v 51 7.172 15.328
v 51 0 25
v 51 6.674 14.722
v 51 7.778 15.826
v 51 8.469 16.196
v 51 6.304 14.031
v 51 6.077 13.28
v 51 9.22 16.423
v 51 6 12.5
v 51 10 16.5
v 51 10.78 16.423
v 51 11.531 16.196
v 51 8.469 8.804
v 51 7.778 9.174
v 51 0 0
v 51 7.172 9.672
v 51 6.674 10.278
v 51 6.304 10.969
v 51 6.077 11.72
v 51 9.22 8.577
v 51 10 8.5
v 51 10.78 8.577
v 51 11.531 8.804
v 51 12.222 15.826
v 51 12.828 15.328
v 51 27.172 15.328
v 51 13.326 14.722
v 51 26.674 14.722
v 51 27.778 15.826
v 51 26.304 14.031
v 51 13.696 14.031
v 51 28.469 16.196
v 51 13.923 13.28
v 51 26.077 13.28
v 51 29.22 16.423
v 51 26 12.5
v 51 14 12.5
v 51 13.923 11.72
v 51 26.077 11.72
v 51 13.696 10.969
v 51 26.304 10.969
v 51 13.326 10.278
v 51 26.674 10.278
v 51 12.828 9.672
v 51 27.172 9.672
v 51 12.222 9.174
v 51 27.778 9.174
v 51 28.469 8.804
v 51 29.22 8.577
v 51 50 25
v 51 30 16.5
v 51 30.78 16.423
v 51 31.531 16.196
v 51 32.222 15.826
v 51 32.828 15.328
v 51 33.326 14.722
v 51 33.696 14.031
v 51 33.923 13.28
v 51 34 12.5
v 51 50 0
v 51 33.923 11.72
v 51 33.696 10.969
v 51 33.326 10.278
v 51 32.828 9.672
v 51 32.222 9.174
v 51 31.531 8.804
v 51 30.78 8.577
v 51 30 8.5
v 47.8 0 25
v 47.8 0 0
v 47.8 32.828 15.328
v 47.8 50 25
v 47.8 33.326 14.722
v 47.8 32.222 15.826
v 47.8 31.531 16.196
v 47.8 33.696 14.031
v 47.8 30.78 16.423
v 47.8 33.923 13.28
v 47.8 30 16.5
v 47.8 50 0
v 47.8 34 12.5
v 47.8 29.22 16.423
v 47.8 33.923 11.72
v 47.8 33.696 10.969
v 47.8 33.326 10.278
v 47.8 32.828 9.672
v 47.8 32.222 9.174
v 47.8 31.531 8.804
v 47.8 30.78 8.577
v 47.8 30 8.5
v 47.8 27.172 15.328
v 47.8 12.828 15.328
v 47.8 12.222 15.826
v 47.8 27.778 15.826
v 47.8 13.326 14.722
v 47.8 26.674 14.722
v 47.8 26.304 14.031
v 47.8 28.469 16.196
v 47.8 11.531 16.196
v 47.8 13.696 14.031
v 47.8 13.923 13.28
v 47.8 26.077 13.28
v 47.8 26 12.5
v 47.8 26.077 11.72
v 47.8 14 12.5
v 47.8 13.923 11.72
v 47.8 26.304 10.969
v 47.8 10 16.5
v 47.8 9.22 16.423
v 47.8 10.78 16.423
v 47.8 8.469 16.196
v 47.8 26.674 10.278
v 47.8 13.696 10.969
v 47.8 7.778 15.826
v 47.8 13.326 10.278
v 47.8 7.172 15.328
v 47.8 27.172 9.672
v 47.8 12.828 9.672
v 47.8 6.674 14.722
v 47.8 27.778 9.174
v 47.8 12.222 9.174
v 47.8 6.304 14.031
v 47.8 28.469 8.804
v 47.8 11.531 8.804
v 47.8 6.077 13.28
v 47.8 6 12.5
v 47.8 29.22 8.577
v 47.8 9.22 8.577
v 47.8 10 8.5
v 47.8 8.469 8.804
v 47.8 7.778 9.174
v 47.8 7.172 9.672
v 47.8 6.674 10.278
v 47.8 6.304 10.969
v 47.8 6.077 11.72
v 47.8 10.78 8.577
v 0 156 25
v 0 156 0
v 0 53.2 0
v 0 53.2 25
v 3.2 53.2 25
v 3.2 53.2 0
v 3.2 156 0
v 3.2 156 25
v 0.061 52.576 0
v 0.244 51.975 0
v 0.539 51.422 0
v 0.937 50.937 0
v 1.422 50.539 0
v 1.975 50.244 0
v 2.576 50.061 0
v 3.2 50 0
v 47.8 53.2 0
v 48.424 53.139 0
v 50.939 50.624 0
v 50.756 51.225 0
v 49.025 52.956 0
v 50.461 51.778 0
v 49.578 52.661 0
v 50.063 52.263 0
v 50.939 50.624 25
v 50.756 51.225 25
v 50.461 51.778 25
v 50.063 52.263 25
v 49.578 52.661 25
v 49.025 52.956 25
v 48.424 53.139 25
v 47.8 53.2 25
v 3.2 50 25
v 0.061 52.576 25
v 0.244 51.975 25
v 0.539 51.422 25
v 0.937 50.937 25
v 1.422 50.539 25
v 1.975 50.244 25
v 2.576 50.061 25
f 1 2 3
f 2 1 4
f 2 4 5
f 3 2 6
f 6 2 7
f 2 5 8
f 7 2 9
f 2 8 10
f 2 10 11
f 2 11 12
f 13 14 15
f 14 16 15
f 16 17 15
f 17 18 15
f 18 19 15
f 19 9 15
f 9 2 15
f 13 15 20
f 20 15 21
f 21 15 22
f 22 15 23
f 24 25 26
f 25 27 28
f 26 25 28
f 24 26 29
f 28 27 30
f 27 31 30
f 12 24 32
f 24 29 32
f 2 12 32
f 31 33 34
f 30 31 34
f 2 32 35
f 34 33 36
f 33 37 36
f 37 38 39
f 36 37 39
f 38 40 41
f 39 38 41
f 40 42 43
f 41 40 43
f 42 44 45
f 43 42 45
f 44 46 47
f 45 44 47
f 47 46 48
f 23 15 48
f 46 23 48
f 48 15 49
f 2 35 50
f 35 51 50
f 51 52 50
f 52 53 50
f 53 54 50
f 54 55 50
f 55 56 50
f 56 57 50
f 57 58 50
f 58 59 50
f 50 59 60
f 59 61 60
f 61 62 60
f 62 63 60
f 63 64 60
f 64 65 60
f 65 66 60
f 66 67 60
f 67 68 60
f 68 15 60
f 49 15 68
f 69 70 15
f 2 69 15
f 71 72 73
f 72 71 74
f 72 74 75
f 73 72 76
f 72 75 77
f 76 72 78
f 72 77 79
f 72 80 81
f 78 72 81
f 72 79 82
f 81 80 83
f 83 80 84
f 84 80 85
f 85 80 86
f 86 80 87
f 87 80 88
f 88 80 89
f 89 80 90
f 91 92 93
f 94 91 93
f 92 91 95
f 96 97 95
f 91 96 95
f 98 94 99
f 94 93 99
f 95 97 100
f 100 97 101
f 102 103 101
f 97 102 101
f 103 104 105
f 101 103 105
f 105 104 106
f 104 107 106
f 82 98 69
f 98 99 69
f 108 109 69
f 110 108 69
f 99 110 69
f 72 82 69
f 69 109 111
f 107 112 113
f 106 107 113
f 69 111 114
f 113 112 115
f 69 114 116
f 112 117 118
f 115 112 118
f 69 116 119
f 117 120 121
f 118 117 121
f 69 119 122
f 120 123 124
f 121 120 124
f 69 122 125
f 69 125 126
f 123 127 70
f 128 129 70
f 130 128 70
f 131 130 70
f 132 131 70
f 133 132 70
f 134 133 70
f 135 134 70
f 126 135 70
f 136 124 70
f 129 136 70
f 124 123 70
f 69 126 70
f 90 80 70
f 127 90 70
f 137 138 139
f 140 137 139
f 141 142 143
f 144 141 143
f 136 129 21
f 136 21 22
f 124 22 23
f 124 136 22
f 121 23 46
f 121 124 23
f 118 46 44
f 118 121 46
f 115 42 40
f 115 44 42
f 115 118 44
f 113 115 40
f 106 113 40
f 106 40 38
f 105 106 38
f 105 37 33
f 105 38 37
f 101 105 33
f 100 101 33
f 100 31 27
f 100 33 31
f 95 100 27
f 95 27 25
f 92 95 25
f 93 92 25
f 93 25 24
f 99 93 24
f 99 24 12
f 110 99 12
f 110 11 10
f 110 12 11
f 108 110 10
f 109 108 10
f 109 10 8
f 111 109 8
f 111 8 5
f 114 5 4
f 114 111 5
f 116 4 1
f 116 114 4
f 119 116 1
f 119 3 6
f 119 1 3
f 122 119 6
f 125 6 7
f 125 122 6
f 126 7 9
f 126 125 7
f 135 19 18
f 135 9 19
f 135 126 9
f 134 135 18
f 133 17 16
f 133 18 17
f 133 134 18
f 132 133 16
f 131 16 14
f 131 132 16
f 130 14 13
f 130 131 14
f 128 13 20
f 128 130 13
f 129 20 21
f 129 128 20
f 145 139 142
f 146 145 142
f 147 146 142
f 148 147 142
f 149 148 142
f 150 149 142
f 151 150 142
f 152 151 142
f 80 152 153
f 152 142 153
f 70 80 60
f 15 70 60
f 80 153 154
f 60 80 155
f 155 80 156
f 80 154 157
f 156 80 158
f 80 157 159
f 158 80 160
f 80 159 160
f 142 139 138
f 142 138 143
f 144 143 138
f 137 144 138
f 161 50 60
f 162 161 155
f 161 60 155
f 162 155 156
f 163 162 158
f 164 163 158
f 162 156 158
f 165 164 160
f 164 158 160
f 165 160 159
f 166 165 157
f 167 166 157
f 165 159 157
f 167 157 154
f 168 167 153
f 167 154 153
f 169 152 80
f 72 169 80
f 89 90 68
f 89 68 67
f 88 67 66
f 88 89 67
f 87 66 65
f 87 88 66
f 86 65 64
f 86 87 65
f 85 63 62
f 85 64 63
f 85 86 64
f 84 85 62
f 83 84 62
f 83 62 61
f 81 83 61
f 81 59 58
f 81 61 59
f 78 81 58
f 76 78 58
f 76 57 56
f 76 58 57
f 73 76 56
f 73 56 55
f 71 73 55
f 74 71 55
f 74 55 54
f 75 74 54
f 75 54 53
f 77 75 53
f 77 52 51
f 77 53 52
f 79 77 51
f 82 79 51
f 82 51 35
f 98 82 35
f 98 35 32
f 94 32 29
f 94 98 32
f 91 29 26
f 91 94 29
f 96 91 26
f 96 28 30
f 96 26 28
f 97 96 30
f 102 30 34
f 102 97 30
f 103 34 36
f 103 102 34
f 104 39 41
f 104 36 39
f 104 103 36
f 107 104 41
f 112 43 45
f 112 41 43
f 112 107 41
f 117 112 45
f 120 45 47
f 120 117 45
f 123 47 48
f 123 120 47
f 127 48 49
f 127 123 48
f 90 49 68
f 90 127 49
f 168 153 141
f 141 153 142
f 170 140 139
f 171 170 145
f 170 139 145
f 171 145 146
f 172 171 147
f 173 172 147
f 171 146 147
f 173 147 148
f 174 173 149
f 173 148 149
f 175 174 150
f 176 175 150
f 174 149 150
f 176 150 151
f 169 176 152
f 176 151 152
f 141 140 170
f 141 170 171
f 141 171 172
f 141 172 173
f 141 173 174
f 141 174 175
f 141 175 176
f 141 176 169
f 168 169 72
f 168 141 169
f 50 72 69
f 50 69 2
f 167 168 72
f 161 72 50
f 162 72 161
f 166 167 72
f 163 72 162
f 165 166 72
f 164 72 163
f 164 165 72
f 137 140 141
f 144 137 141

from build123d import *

# Parameters (mm, degrees)
EXTRUDE_1_DEPTH          = 25
CUT_EXTRUDE_5_DEPTH      = 167.018071306
CUT_EXTRUDE_5_DEPTH_BACK = 167.018071306
SKETCH_7_R               = 4


with BuildPart() as part:
    # ｽｹｯﾁ1 → ﾎﾞｽ - 押し出し1 (new body)
    with BuildSketch(Plane.XY):
        with BuildLine():
            Line((0, 156), (0, 53.2))
            ThreePointArc((0, 53.2), (0.9372583, 50.9372583), (3.2, 50))
            Line((3.2, 50), (47.8, 50))
            Line((47.8, 50), (47.8, 0))
            Line((47.8, 0), (51, 0))
            Line((51, 0), (51, 50))
            ThreePointArc((51, 50), (50.0627417, 52.2627417), (47.8, 53.2))
            Line((47.8, 53.2), (3.2, 53.2))
            Line((3.2, 53.2), (3.2, 156))
            Line((3.2, 156), (0, 156))
        make_face()
    extrude(amount=EXTRUDE_1_DEPTH)

    # ｽｹｯﾁ7 → ｶｯﾄ - 押し出し5 (cut, two sides: drawn at the far end of the back side and taken through both)
    with BuildSketch(Plane(origin=(0, 0, 0), x_dir=(0, 0, -1), z_dir=(1, 0, 0)).offset(-CUT_EXTRUDE_5_DEPTH_BACK)):
        with Locations((-12.5, 10)):
            Circle(SKETCH_7_R)
        with Locations((-12.5, 30)):
            Circle(SKETCH_7_R)
    extrude(amount=CUT_EXTRUDE_5_DEPTH + CUT_EXTRUDE_5_DEPTH_BACK, mode=Mode.SUBTRACT)


solid = part.part
